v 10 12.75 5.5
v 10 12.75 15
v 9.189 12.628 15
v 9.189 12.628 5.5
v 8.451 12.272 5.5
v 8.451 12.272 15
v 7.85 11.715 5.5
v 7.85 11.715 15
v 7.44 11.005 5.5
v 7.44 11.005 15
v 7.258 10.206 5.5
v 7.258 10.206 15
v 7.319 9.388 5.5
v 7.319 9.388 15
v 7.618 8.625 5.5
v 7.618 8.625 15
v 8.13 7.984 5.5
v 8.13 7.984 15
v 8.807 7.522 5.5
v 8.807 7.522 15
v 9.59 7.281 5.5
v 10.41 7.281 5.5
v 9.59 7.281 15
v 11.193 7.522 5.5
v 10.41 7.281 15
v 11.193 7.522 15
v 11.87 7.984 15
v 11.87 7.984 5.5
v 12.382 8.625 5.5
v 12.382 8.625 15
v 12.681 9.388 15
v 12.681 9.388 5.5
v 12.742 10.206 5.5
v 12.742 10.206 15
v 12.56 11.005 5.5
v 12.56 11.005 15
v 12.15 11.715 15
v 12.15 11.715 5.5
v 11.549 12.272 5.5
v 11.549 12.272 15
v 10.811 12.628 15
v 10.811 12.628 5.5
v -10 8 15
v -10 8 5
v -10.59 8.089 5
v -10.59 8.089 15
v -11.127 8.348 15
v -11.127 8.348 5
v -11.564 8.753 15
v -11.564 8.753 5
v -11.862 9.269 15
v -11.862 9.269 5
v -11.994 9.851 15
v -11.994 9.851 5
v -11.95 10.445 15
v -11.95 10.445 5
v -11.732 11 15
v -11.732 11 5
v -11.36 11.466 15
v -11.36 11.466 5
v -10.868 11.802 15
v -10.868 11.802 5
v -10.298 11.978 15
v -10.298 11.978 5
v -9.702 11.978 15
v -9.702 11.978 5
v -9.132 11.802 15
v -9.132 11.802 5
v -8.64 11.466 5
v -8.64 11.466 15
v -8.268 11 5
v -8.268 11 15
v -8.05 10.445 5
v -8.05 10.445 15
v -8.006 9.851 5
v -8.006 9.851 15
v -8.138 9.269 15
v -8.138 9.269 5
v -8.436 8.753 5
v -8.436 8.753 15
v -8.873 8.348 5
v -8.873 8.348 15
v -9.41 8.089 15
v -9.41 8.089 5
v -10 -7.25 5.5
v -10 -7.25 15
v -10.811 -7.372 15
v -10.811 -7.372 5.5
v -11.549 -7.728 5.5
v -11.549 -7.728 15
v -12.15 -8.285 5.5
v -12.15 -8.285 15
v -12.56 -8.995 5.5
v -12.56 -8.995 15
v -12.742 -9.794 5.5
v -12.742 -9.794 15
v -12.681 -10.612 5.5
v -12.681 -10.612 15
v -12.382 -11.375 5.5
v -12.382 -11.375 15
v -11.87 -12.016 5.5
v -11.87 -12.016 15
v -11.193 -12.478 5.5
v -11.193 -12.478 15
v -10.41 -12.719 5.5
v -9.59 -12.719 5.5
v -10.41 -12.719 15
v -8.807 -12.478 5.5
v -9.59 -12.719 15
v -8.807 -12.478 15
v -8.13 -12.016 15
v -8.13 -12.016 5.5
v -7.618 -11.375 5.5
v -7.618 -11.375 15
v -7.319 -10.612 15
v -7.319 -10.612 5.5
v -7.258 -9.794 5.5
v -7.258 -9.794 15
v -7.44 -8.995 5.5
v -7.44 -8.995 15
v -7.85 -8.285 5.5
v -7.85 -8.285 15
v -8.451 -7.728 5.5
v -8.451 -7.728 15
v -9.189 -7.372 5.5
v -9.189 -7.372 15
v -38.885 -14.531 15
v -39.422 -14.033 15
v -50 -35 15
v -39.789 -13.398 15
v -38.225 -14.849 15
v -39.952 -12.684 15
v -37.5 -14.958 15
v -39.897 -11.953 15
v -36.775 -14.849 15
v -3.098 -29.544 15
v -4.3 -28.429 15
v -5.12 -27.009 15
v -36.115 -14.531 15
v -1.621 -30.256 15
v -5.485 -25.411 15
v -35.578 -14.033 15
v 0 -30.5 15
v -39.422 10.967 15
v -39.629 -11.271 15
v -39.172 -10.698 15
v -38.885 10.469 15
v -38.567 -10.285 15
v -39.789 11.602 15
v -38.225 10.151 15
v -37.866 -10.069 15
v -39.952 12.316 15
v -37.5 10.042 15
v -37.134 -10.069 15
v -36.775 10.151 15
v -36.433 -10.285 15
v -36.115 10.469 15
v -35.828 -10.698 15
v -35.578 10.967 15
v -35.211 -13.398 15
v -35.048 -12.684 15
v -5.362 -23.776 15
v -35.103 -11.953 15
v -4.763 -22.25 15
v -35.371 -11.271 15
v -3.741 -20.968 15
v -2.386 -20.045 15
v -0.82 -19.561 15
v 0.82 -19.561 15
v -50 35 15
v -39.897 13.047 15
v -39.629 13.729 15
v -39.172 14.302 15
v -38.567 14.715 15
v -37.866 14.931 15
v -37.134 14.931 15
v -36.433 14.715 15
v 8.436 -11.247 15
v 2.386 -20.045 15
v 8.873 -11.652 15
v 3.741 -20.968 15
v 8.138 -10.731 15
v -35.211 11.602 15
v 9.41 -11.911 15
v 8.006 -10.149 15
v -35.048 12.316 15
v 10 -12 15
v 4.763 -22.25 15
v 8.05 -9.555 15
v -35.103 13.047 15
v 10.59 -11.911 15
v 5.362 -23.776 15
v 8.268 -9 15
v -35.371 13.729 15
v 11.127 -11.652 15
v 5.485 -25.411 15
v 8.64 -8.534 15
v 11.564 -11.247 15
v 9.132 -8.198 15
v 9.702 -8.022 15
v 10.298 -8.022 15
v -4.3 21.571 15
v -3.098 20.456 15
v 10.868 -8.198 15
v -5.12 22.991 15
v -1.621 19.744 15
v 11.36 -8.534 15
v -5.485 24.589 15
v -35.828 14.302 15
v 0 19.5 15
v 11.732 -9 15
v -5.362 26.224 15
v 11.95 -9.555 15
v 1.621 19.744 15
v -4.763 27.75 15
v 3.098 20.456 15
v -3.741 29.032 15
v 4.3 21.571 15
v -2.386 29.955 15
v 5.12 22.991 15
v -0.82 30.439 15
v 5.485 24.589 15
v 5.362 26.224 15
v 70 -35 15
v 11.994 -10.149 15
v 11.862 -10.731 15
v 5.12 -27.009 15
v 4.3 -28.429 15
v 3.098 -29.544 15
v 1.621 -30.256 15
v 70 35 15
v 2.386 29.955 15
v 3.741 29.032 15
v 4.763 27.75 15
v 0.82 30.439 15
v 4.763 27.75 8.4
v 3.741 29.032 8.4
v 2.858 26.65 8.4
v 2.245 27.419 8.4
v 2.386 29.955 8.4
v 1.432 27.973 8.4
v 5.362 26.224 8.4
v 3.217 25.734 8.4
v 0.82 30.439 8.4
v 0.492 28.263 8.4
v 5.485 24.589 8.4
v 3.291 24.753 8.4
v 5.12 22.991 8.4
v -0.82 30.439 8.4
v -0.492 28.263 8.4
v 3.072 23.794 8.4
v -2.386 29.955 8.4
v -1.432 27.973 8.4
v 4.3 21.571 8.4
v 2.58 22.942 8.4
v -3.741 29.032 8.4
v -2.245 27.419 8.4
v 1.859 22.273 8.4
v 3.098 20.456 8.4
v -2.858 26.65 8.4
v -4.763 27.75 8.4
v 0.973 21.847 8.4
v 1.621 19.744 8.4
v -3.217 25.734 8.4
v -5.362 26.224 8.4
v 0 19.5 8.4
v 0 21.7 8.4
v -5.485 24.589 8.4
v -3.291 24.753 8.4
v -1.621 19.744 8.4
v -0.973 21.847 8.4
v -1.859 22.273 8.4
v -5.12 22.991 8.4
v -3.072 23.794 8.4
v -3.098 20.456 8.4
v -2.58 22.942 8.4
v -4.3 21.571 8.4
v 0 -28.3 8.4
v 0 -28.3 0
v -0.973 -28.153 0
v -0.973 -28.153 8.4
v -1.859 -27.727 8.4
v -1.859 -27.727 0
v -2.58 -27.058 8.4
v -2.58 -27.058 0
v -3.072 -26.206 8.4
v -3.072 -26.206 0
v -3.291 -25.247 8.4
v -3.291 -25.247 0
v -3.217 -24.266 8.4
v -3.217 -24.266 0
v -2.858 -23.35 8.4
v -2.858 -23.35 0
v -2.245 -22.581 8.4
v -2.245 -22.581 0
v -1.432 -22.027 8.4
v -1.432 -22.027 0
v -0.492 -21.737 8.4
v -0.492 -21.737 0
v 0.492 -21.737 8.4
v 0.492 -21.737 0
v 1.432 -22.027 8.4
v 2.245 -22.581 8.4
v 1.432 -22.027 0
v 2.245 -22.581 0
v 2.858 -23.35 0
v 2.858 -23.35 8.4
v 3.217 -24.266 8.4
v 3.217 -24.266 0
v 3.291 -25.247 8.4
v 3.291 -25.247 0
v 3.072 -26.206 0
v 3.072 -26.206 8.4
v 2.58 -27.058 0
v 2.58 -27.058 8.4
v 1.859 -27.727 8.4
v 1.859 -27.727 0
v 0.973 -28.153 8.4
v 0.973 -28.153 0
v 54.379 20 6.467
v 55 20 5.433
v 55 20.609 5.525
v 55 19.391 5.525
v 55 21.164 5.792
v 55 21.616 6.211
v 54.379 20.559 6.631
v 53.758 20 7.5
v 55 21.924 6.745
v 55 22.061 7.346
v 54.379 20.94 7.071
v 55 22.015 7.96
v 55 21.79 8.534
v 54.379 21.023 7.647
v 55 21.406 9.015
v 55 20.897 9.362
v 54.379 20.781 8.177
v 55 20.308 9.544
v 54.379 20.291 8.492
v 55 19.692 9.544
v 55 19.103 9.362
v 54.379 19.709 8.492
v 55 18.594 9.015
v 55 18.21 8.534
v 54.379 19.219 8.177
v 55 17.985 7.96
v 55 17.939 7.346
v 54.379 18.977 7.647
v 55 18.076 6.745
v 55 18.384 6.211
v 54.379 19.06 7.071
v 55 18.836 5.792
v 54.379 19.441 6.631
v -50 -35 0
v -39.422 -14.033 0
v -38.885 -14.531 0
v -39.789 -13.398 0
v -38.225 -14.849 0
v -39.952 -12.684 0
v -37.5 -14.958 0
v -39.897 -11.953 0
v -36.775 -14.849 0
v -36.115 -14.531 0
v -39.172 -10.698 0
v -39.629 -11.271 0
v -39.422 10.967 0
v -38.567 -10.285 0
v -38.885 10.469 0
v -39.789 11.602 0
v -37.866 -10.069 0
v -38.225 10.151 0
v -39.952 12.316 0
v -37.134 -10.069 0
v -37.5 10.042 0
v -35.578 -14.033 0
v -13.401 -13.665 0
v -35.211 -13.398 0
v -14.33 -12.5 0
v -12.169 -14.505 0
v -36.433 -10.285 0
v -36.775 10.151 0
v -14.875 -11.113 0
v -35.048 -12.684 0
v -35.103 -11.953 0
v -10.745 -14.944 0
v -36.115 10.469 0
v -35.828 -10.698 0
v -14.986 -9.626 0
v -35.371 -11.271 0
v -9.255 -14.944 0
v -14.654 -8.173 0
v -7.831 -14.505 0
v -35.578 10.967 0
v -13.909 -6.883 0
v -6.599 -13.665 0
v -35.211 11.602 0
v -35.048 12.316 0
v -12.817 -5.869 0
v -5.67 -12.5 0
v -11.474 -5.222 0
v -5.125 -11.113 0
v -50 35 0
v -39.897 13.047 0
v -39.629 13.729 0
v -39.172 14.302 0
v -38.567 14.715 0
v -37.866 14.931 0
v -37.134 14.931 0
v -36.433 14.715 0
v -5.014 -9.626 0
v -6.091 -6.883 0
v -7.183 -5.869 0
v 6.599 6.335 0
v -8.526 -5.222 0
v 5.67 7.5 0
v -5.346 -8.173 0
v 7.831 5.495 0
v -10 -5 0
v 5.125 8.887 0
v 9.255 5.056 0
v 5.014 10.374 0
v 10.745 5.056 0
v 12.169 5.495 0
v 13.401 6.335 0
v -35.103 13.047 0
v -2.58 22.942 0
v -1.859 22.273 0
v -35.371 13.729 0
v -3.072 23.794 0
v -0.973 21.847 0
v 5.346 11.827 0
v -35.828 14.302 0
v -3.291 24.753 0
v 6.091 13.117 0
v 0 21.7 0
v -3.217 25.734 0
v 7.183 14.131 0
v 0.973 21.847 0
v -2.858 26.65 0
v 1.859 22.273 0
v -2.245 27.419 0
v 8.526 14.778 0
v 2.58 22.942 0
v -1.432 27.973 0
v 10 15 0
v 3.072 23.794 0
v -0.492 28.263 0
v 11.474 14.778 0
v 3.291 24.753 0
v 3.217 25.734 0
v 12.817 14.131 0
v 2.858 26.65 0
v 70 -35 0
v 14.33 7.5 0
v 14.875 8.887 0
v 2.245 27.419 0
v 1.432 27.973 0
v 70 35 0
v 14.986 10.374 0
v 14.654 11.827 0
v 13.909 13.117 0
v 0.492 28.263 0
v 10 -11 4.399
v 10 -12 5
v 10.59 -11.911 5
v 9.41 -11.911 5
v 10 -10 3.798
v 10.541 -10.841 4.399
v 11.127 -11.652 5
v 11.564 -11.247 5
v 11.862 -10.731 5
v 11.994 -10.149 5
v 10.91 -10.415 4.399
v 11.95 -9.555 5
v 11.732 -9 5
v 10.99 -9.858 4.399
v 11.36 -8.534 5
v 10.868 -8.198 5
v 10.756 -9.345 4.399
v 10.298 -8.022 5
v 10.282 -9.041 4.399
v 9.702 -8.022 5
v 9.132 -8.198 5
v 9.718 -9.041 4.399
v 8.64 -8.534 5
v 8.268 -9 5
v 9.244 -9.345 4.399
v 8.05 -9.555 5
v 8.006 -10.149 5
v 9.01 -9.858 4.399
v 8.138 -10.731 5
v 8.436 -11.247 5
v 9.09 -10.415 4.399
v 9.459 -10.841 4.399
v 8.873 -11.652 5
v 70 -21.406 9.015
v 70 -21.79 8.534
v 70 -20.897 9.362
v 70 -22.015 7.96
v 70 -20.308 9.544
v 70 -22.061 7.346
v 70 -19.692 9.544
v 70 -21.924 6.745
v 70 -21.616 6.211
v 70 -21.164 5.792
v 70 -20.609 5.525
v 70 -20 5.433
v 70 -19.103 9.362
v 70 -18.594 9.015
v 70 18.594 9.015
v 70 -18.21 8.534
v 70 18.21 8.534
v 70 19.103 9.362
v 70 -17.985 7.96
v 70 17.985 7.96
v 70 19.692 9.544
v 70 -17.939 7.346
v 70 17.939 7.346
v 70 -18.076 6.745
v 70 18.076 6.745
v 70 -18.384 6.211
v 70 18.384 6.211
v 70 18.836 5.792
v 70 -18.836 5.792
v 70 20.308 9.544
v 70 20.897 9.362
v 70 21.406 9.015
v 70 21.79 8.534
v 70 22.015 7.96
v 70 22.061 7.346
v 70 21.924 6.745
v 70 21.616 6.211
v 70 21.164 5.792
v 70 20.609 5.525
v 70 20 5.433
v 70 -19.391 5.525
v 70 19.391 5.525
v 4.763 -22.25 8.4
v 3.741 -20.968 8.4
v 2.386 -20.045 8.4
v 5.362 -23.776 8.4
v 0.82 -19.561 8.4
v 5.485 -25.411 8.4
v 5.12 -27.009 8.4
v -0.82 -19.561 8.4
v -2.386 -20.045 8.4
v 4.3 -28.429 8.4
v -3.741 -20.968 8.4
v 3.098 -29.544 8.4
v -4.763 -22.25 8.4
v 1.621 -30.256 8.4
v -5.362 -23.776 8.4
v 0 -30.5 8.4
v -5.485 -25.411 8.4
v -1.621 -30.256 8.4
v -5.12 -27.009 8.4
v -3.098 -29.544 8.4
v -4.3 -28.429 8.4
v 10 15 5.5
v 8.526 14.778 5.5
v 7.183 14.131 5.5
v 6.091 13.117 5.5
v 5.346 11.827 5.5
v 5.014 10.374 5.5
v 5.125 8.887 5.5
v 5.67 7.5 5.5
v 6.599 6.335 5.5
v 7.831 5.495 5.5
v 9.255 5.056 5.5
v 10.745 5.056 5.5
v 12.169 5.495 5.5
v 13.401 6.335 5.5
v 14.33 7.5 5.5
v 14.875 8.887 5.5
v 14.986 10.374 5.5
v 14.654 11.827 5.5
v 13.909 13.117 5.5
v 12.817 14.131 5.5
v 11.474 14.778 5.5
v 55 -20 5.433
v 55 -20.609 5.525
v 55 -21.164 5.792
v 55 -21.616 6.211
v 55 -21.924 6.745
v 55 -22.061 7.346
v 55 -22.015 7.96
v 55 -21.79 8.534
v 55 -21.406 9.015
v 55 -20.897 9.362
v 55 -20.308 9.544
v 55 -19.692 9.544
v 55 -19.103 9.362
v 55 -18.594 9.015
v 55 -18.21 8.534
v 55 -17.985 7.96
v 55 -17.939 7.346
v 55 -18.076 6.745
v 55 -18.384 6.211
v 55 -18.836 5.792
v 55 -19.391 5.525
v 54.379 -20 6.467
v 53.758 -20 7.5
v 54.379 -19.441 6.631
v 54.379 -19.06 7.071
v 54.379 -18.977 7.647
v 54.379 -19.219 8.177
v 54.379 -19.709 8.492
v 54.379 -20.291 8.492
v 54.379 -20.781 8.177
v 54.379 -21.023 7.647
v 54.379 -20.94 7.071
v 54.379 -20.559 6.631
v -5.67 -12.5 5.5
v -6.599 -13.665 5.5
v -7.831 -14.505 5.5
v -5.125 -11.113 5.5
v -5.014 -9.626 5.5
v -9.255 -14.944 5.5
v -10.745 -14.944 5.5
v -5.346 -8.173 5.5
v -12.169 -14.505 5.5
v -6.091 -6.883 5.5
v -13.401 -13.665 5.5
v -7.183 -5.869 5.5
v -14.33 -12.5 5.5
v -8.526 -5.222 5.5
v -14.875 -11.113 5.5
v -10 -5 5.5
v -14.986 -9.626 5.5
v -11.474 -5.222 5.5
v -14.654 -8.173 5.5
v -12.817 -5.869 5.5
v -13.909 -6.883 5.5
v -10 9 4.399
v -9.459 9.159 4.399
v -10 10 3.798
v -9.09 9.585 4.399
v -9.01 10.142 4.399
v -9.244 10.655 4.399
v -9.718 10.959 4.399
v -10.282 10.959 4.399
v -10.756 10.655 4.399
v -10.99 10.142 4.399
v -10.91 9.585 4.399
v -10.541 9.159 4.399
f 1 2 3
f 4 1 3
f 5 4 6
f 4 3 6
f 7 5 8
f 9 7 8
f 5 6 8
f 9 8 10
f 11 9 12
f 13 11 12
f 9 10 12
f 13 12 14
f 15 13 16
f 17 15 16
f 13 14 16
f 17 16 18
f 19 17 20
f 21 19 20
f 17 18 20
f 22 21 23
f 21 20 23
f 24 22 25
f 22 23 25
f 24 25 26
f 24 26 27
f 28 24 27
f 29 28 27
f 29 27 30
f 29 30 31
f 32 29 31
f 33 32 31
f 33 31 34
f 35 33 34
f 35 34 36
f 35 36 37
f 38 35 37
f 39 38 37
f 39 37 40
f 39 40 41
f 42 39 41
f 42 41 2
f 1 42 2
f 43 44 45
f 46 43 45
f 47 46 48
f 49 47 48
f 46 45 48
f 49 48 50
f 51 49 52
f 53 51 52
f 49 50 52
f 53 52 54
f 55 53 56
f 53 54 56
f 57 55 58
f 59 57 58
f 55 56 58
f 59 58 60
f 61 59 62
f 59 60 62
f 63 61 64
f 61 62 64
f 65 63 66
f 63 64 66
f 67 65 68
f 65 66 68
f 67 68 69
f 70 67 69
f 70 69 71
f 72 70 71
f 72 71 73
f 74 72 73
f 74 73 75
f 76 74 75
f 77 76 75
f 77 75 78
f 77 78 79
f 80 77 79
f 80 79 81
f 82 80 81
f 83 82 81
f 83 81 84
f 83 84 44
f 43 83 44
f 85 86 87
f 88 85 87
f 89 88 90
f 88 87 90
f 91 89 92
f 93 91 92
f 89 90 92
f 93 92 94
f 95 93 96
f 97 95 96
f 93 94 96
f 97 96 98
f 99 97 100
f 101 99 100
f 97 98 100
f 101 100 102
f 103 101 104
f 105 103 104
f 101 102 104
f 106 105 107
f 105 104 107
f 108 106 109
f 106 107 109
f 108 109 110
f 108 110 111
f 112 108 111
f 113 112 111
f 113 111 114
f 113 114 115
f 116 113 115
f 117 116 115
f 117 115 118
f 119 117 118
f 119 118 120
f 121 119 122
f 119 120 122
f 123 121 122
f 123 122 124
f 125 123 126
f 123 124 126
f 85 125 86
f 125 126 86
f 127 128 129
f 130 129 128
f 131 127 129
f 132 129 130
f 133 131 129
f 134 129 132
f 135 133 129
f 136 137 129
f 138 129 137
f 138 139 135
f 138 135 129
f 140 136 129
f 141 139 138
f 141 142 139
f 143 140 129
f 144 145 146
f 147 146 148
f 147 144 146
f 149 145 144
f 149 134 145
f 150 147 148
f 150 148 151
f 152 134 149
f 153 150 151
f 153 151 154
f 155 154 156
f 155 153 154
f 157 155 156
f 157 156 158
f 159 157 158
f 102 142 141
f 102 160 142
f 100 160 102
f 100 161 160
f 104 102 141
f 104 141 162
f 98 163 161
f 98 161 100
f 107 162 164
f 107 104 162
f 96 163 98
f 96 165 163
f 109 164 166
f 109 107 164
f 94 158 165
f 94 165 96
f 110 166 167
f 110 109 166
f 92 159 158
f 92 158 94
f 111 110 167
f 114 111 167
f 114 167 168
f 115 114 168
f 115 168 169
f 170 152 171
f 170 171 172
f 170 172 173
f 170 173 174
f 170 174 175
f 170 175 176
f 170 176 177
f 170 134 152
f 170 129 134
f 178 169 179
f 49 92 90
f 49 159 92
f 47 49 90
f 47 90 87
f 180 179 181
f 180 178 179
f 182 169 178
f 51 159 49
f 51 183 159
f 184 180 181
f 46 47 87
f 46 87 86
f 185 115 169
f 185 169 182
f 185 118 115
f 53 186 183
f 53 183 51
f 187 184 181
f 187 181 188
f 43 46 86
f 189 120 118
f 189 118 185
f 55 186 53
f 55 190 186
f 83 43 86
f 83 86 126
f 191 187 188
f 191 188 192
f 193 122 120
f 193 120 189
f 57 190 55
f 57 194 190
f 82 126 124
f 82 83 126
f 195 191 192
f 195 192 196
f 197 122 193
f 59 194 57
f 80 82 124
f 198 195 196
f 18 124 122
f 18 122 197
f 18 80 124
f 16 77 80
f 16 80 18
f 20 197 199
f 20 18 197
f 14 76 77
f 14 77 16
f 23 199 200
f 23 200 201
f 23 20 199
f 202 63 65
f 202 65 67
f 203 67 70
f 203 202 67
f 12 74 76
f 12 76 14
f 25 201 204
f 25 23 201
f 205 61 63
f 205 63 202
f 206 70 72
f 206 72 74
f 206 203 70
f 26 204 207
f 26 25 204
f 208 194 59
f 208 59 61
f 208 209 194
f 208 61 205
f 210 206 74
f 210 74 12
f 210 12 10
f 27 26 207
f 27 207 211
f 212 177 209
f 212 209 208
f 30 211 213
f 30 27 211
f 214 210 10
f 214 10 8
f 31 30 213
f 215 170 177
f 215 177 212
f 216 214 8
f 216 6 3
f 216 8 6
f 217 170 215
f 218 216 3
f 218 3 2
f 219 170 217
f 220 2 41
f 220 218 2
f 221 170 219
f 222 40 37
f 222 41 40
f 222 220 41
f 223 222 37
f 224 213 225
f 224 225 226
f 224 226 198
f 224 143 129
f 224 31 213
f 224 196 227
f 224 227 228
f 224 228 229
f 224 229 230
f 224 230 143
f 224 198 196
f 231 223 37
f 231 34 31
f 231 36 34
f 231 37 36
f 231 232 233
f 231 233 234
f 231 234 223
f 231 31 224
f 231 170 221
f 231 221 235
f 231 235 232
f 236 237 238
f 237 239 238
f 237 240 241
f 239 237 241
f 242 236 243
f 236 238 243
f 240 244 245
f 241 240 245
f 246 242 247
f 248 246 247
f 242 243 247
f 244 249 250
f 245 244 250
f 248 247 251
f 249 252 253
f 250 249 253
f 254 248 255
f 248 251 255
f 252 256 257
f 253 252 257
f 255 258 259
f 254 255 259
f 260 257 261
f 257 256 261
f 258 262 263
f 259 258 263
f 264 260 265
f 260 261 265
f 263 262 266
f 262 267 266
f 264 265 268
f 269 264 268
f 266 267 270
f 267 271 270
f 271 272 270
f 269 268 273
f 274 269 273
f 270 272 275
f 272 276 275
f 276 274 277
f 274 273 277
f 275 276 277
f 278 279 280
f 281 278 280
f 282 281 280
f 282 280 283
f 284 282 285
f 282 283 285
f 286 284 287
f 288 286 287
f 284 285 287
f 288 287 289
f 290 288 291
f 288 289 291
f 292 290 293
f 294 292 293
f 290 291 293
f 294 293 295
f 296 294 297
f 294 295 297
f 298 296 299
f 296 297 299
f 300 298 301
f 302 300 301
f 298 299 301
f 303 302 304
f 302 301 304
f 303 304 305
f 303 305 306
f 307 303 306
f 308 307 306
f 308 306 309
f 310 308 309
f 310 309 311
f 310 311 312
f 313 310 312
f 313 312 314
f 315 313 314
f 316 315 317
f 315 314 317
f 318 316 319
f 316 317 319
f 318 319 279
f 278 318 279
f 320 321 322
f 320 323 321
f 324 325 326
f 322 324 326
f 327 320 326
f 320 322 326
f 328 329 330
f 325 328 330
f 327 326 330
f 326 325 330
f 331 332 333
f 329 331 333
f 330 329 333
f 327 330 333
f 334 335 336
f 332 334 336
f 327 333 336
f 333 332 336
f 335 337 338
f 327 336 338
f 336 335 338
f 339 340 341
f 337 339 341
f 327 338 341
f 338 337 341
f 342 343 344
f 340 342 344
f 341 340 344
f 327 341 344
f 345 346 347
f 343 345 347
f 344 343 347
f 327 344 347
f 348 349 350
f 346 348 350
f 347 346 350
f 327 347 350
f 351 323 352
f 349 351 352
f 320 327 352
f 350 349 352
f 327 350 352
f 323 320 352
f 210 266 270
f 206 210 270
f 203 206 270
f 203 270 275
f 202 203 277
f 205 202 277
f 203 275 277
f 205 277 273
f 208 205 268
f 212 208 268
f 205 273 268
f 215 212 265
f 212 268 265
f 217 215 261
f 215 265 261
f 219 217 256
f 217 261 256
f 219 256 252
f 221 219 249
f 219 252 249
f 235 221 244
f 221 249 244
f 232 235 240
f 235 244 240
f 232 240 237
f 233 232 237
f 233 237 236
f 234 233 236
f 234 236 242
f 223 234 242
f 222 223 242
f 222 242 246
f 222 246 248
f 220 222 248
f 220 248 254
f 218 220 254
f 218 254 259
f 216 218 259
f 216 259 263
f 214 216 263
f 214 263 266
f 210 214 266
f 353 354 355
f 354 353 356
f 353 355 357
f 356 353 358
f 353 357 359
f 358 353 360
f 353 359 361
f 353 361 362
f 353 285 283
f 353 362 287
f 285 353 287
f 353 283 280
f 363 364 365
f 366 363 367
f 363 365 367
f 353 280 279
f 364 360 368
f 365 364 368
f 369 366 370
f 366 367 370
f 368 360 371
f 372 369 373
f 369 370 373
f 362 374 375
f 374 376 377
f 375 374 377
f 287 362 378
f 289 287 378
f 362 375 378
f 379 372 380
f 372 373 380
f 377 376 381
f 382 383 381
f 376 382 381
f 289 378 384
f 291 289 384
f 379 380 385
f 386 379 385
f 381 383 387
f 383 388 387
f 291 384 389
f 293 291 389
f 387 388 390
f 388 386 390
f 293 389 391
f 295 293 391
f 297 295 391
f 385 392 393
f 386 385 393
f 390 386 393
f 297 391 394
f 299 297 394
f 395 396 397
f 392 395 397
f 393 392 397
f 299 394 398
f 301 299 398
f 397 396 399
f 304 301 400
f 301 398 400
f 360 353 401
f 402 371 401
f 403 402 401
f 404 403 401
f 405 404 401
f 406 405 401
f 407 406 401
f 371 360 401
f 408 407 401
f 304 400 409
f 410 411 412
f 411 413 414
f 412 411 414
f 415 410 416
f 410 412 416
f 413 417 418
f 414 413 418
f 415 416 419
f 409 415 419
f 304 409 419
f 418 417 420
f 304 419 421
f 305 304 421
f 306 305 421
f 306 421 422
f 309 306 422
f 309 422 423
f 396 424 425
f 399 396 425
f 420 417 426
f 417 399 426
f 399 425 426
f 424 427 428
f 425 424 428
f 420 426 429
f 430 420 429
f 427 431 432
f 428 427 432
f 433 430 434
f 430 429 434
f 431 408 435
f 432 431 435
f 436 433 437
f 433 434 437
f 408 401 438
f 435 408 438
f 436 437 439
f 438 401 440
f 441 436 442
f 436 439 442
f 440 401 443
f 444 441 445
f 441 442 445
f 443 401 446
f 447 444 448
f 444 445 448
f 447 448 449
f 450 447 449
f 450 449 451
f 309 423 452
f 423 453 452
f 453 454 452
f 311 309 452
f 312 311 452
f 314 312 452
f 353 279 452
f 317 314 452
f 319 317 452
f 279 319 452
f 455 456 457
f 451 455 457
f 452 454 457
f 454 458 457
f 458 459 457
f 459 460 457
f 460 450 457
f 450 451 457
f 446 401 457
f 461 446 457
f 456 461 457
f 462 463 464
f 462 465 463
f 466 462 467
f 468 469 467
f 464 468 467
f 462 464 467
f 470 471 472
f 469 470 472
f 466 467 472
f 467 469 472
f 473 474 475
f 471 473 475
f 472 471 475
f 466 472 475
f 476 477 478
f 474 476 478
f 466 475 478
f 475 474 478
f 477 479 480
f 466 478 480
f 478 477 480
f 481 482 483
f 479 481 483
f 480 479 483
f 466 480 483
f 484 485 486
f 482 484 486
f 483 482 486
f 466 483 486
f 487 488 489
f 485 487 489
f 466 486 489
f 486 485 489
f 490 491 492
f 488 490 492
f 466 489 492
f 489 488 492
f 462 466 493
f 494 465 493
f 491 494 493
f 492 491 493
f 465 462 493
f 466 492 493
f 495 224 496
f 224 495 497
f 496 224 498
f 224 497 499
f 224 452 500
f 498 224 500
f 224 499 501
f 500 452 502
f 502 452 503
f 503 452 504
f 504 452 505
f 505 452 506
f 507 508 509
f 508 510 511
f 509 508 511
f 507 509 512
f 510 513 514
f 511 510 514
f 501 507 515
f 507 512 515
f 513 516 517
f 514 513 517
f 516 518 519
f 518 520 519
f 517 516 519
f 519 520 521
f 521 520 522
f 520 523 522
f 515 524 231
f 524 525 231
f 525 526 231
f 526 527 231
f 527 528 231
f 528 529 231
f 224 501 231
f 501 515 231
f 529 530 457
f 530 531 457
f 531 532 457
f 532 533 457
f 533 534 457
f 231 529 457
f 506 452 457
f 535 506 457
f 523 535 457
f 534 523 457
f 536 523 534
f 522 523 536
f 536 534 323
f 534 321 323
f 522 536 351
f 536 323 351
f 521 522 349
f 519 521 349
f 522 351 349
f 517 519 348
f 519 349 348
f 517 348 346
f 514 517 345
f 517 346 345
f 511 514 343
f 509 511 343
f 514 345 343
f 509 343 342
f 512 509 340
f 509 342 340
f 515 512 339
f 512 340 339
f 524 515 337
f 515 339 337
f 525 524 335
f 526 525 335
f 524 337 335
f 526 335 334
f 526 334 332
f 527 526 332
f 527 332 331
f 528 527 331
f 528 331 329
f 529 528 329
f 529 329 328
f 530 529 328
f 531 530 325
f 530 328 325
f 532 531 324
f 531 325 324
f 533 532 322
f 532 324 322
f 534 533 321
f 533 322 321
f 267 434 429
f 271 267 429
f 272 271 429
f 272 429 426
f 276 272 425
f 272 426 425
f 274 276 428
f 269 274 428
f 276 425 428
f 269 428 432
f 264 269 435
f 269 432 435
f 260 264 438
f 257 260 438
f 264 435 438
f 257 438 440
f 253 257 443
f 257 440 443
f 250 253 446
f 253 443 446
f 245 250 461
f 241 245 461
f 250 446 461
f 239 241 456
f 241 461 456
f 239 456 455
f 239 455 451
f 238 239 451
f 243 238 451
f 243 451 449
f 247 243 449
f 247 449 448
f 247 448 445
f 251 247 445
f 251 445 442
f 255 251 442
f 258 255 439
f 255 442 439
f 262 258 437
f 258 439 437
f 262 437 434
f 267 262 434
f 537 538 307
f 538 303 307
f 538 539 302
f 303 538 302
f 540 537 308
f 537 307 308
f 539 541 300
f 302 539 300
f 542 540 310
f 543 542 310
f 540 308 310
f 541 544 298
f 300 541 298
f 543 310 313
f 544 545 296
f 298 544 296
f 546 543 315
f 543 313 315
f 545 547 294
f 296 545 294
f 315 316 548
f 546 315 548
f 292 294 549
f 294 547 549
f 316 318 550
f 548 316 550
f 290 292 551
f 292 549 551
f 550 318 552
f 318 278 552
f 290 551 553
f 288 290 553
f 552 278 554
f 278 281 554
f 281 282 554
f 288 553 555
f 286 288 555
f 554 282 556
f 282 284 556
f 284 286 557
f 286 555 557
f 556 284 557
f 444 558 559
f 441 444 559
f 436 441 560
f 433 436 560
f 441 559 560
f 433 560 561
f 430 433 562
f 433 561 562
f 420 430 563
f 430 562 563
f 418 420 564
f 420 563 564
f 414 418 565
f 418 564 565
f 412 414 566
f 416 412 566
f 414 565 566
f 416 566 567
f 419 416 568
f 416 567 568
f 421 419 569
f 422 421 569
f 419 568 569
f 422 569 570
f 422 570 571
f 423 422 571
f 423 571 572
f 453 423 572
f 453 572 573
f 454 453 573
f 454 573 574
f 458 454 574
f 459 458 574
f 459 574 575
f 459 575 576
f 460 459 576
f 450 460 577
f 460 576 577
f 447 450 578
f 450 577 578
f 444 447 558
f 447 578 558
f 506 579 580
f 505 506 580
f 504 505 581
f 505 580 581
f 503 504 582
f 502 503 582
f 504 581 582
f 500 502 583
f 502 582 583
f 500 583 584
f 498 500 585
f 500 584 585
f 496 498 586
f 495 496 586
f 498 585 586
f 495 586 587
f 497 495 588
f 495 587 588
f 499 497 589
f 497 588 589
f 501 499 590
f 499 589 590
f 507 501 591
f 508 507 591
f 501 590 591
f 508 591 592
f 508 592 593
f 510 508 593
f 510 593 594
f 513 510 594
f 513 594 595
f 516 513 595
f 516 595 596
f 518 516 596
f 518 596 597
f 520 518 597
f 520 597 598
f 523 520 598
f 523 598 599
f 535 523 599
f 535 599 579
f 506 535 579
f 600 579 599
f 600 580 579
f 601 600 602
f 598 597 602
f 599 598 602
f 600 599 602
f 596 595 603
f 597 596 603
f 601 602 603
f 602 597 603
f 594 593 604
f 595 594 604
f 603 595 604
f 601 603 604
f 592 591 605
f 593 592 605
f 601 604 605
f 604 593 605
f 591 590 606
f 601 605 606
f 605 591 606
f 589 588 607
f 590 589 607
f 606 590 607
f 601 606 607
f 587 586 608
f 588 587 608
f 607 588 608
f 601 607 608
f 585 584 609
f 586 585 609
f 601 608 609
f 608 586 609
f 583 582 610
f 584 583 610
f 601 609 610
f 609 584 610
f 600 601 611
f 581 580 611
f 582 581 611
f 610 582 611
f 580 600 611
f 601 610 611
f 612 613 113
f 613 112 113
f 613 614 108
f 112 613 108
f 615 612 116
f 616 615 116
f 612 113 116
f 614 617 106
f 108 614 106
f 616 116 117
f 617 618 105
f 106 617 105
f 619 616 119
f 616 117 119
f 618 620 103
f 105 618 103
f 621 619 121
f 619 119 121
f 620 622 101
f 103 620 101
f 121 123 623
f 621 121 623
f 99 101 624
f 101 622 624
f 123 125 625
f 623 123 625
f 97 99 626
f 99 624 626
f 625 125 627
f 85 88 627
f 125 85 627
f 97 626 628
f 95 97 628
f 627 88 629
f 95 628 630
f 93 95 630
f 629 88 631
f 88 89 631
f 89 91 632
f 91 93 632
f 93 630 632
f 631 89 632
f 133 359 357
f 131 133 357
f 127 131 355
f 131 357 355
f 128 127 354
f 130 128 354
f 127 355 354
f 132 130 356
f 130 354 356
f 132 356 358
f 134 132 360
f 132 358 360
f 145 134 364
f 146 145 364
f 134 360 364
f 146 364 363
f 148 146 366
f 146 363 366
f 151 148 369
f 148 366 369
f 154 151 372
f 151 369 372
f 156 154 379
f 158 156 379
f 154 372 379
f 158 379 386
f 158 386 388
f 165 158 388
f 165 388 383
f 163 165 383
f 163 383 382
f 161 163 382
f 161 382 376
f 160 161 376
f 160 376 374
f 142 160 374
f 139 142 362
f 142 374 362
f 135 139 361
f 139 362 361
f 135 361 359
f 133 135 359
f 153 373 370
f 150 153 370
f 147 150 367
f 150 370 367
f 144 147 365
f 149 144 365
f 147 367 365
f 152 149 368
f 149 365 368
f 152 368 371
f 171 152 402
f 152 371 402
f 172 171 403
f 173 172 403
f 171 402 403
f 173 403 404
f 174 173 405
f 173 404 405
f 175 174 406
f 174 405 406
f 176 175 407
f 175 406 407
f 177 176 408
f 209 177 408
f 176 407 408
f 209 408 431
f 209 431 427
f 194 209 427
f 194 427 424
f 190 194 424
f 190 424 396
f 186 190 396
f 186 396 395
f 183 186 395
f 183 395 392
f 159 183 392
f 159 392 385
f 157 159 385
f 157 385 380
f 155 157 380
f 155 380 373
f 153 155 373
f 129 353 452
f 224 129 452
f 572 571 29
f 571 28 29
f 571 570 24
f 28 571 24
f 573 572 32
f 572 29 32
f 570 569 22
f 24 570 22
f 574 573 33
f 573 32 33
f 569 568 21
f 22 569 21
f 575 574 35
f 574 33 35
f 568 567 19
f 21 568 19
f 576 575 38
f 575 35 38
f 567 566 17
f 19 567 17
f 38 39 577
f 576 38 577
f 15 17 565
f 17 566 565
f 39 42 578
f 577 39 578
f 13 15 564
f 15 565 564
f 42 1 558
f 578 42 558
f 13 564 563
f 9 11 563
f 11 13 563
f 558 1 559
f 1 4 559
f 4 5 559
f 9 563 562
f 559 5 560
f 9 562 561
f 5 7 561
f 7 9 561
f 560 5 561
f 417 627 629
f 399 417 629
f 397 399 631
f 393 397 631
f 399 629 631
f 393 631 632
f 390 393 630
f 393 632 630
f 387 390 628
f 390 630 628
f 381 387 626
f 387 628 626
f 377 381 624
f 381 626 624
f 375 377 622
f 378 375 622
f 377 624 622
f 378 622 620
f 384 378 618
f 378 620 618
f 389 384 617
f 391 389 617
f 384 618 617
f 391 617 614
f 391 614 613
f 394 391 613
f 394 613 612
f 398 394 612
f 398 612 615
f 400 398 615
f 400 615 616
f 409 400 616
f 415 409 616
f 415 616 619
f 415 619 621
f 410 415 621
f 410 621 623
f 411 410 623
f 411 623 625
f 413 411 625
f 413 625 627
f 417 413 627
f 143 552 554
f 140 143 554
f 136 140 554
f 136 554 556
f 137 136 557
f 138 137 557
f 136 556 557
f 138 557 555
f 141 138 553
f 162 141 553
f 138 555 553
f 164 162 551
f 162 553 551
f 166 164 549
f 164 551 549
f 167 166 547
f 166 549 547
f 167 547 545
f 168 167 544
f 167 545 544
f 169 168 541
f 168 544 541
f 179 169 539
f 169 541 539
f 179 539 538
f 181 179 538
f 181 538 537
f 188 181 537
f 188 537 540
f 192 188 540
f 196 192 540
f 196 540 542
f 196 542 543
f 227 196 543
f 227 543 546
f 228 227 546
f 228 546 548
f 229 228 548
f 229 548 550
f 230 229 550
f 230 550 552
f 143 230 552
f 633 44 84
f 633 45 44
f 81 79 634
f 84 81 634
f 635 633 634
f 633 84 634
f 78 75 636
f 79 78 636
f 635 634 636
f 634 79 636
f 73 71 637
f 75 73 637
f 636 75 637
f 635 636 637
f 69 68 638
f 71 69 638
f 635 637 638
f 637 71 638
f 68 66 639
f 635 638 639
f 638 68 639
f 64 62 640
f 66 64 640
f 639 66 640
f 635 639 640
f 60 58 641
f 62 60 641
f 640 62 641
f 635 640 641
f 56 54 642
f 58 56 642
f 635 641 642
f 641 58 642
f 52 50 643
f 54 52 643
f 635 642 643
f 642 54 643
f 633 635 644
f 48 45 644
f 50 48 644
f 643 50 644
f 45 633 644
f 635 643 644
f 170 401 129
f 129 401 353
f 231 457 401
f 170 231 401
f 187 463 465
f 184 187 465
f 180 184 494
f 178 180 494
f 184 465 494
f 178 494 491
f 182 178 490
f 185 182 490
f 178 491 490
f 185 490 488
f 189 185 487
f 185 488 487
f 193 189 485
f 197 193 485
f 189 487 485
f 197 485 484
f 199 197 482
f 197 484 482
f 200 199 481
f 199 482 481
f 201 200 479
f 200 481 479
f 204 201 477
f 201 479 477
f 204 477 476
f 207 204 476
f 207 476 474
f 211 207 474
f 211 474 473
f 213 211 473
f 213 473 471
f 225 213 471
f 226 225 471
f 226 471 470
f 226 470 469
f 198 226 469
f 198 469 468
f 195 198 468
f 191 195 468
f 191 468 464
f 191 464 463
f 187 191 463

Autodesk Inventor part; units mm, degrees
ref_plane "YZ Plane" through (0, 0, 0) normal (1, 0, 0) x (0, 1, 0)
ref_plane "XZ Plane" through (0, 0, 0) normal (0, 1, 0) x (-1, 0, 0)
ref_plane "XY Plane" through (0, 0, 0) normal (0, 0, 1) x (1, 0, 0)
sketch "Sketch1" plane through (0, 0, 0) normal (0, 0, 1) x (1, 0, 0)
  line L0 (0, 49) -> (0, -49) construction
  line L1 (-74, 0) -> (94, 0) construction
  line L2 (-50, -35) -> (70, -35)
  line L3 (70, -35) -> (70, 35)
  line L4 (70, 35) -> (-50, 35)
  line L5 (-50, 35) -> (-50, -35)
  point P0 (0, 0)
  dimension "d4" = 70
  dimension "d49" = 120
  dimension "d50" = 50
  dimension "d51" = 35
extrude "Extrusion3" add sketch "Sketch1" along normal blind 15
sketch "Sketch2" plane through (0, 0, 15) normal (0, 0, 1) x (1, 0, 0)
  point P0 (0, 0)
  point P1 (0, -25)
  point P2 (0, 25)
  dimension "d15" = 25
  dimension "d16" = 25
hole "Hole1" at (0, -25, 15) at (0, 25, 15) direction (0, 0, -1) diameter 6.6 end through all counterbore diameter 11 counterbore depth 6.6 clearance for "Socket Head Cap Screw DIN EN ISO 4762" size "M6" standard "DIN"
sketch "Sketch3" plane through (0, 0, 15) normal (0, 0, 1) x (1, 0, 0)
  point P0 (0, 0)
  point P1 (-37.5, -12.5)
  point P2 (-37.5, 12.5)
  dimension "d24" = 25
  dimension "d25" = 12.5
  dimension "d26" = 37.5
hole "Hole2" at (-37.5, -12.5, 15) at (-37.5, 12.5, 15) direction (0, 0, -1) diameter 4.917 end through all thread size "M6x1" class "6H" standard "ISO Metric profile"
sketch "Sketch4" plane through (0, 0, 0) normal (0, 0, -1) x (-1, 0, 0)
  point P0 (0, 0)
  point P1 (10, -10)
  point P2 (-10, 10)
  dimension "d34" = 10
  dimension "d35" = 10
  dimension "d36" = 10
  dimension "d37" = 10
hole "Hole3" at (-10, -10, 0) at (10, 10, 0) direction (0, 0, 1) diameter 5.5 end through all counterbore diameter 10 counterbore depth 5.5 clearance for "Socket Head Cap Screw DIN EN ISO 4762" size "M5" standard "DIN"
sketch "Sketch5" plane through (0, 0, 15) normal (0, 0, 1) x (1, 0, 0)
  point P0 (0, 0)
  point P1 (10, -10)
  point P2 (-10, 10)
  dimension "d45" = 10
  dimension "d46" = 10
  dimension "d47" = 10
  dimension "d48" = 10
hole "Hole4" at (10, -10, 15) at (-10, 10, 15) direction (0, 0, -1) diameter 4 depth 10 tip angle 118
sketch "Sketch6" plane through (70, -35, 0) normal (1, 0, 0) x (0, 0, -1)
  line L0 (0, 0) -> (-15, 0) projected
  line L1 (0, 0) -> (0, 70) projected
  point P0 (0, 35)
  point P1 (-7.5, 15)
  point P2 (-7.5, 55)
  point P3 (-7.5, 0)
  point P4 (0, 35)
  point P5 (0, 35)
  dimension "d59" = 20
  dimension "d60" = 20
hole "Hole5" at (70, -20, 7.5) at (70, 20, 7.5) direction (-1, 0, 0) diameter 4.134 depth 15 tip angle 118 thread size "M5x0.8" class "6H" standard "ISO Metric profile"
properties part number "23-0064 Base plate" material "ALMg4,5Mn-5083-(D54S)"
